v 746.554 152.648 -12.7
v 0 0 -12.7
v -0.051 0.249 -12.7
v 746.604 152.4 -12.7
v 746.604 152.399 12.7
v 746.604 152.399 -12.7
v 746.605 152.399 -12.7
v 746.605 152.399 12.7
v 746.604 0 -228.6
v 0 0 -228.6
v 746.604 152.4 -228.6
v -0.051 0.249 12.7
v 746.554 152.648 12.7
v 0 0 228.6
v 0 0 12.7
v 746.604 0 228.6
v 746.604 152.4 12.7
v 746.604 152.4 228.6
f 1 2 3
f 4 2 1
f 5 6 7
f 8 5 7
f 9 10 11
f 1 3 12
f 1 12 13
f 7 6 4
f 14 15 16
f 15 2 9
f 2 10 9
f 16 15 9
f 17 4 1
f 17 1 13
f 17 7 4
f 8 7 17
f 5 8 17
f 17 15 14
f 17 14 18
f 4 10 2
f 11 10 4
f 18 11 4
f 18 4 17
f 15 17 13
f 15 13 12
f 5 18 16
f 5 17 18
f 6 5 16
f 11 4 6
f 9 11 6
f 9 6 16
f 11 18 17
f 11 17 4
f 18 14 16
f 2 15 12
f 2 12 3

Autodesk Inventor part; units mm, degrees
ref_plane "YZ Plane" through (0, 0, 0) normal (1, 0, 0) x (0, 1, 0)
ref_plane "XZ Plane" through (0, 0, 0) normal (0, 1, 0) x (-1, 0, 0)
ref_plane "XY Plane" through (0, 0, 0) normal (0, 0, 1) x (1, 0, 0)
sketch "Sketch1" plane through (0, 0, 0) normal (0, 0, 1) x (1, 0, 0)
  line L0 (0, 0) -> (746.6045, 152.4)
  line L1 (0, 182.88) -> (0, -30.48) projected
  line L2 (-149.3209, 0) -> (895.9254, 0) projected
  line L3 (746.6045, 152.4) -> (746.6045, 0)
  line L4 (0, 0) -> (746.6045, 0)
  dimension "d0" = 152.4
  dimension "d1" = 762
extrude "Extrusion1" add sketch "Sketch1" along normal mid plane 457.2
sketch "Sketch4" plane through (0, 0, 228.6) normal (-0.2, 0.9798, 0) x (0.9798, 0.2, 0)
  line L0 (914.4, 228.6) -> (-152.4, 228.6) projected
  line L1 (762, 215.9) -> (0, 215.9)
  line L2 (0, 215.9) -> (0, 241.3)
  line L3 (0, 241.3) -> (762, 241.3)
  line L4 (762, 241.3) -> (762, 215.9)
  line L5 (762, 215.9) -> (0, 241.3) construction
  line L6 (0, 215.9) -> (762, 241.3) construction
  line L7 (0, 0) -> (0, 457.2) projected
  line L8 (762, 0) -> (0, 0) projected
  line L9 (762, 457.2) -> (762, 0) projected
  line L10 (0, 457.2) -> (762, 457.2) projected
  line L11 (762, 457.2) -> (762, 0) projected
  line L12 (0, 0) -> (0, 457.2) projected
  point P0 (0, 228.6)
  point P1 (381, 228.6)
  dimension "d6" = 25.4
extrude "Extrusion2" add sketch "Sketch4" along normal blind 0.254 contours L4 L1 L2 L0 | L0 L2 L3 L4
properties part number "Ramp"
